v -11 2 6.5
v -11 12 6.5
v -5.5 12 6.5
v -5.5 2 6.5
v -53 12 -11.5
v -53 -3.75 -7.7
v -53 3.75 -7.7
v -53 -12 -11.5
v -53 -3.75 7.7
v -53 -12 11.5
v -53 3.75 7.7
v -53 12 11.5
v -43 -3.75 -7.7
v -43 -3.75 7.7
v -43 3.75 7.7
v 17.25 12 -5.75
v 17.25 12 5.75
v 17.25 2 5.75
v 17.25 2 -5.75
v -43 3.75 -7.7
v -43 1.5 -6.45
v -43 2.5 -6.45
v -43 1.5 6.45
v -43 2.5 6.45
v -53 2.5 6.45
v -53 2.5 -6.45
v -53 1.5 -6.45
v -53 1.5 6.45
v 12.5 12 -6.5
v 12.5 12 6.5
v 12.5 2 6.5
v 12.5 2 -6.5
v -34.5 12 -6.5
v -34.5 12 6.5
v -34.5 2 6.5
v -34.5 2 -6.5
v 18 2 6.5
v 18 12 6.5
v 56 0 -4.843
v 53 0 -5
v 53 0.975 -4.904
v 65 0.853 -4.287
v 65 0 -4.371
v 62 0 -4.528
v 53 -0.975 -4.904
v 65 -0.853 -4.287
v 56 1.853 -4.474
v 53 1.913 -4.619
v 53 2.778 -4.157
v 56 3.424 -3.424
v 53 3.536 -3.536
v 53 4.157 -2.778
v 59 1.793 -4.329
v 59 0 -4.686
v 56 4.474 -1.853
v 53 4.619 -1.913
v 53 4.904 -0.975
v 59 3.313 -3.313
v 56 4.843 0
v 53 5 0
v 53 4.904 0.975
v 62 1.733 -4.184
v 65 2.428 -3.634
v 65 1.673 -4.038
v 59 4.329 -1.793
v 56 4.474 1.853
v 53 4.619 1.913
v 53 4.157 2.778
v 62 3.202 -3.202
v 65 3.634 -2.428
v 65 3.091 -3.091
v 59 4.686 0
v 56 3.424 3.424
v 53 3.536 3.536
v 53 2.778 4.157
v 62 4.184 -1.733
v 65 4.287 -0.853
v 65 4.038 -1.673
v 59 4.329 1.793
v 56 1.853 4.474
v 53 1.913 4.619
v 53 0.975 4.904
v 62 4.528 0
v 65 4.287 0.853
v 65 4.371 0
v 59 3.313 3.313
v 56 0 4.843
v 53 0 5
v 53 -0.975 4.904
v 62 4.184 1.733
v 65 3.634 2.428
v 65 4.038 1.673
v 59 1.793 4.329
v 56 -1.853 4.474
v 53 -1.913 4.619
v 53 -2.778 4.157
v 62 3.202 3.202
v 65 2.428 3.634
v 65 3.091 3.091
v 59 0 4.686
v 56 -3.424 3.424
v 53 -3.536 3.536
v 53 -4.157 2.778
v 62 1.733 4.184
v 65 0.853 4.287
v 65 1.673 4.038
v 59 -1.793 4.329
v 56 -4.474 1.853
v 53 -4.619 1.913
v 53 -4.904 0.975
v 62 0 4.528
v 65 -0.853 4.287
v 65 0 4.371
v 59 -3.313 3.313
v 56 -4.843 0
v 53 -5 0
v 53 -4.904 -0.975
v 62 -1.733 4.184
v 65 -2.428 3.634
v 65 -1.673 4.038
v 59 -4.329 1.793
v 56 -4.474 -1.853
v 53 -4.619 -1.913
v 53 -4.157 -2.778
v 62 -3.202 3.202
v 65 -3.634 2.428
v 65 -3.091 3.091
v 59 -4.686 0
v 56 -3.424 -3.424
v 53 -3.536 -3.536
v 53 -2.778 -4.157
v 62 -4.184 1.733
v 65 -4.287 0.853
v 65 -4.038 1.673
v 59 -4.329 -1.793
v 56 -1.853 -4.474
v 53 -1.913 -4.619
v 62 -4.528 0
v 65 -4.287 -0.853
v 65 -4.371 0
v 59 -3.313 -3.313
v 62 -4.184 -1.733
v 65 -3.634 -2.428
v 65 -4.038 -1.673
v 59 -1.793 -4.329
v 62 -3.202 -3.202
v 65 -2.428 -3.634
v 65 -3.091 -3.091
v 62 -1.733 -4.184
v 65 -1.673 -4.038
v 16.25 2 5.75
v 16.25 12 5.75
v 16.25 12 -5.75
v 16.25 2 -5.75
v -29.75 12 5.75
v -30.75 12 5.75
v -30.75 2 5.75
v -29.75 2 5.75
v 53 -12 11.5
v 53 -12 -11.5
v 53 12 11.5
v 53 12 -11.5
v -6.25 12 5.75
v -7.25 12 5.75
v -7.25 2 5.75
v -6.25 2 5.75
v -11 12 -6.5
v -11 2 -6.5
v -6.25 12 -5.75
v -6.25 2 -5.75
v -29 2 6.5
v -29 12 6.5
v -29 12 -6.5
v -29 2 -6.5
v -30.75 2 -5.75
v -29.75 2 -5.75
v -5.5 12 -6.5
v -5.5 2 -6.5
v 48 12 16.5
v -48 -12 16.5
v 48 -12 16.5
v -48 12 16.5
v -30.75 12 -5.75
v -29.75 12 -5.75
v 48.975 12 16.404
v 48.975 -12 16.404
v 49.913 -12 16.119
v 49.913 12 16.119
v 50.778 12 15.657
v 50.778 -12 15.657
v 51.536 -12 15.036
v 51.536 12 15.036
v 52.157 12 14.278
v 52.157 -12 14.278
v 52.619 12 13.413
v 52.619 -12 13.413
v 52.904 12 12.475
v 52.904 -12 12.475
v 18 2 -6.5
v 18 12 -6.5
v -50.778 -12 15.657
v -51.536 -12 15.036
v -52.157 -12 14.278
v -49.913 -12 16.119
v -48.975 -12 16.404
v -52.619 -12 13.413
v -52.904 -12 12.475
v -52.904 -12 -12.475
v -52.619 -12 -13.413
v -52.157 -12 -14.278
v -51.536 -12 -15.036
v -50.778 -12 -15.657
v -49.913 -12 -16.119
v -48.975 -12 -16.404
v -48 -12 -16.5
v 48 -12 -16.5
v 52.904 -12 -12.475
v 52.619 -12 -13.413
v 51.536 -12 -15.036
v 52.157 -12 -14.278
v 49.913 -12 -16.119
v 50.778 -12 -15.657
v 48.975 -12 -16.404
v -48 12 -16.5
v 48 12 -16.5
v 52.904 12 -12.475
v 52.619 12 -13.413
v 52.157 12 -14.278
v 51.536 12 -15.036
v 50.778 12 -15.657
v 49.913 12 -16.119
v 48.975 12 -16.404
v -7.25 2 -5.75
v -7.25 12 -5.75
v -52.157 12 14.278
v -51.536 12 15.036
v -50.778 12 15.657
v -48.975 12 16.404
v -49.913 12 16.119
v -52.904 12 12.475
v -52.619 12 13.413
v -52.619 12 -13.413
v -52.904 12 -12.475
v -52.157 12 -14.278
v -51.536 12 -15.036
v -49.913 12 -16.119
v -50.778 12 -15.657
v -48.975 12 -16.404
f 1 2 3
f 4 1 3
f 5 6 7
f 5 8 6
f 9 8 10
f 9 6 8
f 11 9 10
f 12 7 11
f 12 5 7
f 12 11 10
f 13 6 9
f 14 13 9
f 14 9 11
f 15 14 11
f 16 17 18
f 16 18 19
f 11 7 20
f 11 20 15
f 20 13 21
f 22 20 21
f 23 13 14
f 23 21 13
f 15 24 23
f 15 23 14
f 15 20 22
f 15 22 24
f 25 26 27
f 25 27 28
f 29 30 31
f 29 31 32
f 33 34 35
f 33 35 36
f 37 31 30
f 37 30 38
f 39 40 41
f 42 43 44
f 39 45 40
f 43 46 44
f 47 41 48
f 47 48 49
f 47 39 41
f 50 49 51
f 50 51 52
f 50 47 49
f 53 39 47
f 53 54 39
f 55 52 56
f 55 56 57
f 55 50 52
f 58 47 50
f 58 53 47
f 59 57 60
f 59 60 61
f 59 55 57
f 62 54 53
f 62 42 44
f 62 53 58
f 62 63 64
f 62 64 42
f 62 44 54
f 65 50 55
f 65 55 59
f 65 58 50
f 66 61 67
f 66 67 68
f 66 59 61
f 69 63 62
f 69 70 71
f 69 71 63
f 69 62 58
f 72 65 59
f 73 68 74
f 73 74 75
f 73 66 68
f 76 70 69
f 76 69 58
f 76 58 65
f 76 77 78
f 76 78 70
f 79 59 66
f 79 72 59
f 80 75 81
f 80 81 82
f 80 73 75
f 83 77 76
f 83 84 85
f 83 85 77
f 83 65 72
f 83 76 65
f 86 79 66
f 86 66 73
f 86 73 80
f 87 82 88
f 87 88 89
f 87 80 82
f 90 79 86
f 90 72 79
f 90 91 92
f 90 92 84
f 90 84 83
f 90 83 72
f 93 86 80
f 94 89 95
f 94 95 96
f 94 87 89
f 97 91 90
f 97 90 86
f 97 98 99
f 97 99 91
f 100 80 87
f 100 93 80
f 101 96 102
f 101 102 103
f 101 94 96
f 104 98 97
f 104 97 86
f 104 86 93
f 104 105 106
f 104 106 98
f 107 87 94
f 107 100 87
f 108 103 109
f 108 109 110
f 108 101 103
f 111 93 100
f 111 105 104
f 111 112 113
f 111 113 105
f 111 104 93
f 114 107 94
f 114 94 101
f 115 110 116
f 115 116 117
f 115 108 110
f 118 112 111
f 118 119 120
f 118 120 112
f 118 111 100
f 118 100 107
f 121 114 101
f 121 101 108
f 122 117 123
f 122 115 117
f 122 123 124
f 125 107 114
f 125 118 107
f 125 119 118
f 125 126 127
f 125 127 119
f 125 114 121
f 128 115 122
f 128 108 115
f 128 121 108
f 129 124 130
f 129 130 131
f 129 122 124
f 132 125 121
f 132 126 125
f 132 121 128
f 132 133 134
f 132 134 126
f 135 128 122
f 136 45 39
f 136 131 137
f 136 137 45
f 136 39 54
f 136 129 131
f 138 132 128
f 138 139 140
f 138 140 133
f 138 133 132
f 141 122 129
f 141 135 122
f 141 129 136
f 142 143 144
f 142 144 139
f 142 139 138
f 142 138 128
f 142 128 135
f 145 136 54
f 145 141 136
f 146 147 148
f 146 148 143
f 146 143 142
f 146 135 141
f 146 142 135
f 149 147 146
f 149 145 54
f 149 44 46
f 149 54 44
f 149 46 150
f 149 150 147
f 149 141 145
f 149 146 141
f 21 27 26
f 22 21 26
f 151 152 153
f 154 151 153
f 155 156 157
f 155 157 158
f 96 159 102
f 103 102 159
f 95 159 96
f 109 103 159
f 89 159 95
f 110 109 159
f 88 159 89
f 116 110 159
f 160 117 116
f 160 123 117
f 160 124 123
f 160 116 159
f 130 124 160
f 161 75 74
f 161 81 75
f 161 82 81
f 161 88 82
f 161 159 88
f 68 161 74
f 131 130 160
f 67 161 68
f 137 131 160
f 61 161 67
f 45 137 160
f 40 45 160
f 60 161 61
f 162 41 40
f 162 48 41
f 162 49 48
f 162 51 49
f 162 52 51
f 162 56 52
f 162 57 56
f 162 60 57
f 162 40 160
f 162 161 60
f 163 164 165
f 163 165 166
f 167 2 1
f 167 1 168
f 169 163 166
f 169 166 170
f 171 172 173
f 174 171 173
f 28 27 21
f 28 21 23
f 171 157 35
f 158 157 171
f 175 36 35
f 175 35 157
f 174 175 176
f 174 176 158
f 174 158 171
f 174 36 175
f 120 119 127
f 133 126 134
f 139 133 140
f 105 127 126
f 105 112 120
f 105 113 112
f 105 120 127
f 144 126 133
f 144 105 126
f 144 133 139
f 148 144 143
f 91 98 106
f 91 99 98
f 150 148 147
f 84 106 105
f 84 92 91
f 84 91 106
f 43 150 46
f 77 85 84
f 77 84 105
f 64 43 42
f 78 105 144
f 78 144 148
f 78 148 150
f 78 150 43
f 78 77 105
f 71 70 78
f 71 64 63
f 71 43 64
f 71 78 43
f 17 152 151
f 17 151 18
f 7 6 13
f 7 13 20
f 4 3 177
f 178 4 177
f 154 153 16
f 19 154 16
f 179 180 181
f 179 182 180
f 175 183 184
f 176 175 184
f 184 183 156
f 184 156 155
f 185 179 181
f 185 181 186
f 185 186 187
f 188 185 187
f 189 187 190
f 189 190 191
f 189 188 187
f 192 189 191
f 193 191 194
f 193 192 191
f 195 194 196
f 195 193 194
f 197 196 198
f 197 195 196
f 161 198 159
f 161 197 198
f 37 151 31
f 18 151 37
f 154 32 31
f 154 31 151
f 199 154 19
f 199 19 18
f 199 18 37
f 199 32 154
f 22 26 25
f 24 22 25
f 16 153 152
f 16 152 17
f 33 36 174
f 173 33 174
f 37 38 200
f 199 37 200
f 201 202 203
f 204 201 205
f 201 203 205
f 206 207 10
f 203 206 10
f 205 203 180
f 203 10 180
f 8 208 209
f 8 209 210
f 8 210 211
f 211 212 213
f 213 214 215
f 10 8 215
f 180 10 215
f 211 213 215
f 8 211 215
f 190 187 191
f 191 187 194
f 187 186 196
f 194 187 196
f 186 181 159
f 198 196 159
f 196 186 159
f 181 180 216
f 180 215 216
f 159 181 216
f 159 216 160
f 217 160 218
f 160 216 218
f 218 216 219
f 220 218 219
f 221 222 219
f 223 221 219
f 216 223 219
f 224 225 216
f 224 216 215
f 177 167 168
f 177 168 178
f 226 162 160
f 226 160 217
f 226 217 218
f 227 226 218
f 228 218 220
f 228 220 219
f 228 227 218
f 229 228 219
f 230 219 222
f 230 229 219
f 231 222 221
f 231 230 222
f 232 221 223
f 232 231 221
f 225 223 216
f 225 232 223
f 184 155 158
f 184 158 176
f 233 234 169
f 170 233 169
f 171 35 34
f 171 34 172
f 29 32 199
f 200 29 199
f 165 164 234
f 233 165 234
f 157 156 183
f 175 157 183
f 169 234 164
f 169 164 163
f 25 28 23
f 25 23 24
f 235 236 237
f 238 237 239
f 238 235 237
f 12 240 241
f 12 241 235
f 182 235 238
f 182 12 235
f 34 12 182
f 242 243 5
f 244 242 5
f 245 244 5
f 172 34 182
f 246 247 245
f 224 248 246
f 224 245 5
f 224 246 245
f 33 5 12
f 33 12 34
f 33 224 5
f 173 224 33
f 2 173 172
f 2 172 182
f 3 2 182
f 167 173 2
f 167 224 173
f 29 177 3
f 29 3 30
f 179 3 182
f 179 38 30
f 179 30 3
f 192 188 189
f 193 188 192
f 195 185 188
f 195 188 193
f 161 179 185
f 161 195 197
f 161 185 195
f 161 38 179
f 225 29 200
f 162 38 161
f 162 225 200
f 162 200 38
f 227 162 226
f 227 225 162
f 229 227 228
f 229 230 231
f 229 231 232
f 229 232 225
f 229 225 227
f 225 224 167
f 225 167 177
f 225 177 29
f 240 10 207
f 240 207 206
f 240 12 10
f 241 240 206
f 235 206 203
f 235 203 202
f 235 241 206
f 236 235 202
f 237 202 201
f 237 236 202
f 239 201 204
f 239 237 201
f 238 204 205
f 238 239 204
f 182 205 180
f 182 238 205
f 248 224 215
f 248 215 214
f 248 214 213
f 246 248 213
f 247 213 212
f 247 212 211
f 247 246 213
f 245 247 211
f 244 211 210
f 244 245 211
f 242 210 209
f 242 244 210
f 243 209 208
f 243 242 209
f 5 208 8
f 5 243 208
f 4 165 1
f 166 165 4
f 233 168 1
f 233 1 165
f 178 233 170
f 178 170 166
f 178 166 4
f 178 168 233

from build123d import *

# Parameters (mm, degrees)
BOSS_EXTRUDE1_DEPTH = 12
SKETCH2_W           = 5.5
SKETCH2_H           = 13
SKETCH2_W_2         = 1
SKETCH2_H_2         = 11.5
CUT_EXTRUDE1_DEPTH  = 10
SKETCH3_W           = 15.4
SKETCH3_H           = 7.5
SKETCH3_W_2         = 12.9
SKETCH3_H_2         = 1
CUT_EXTRUDE2_DEPTH  = 10
SKETCH4_R           = 5
BOSS_EXTRUDE2_DEPTH = 12
BOSS_EXTRUDE2_TAPER = 3


with BuildPart() as part:
    # Sketch1 → Boss-Extrude1 (new, symmetric)
    with BuildSketch(Plane(origin=(0, 0, 0), x_dir=(1, 0, 0), z_dir=(0, 1, 0))):
        with BuildLine():
            Line((-48, -16.5), (48, -16.5))
            ThreePointArc((48, -16.5), (51.535533906, -15.035533906), (53, -11.5))
            Line((53, -11.5), (53, 11.5))
            ThreePointArc((53, 11.5), (51.535533906, 15.035533906), (48, 16.5))
            Line((48, 16.5), (-48, 16.5))
            ThreePointArc((-48, 16.5), (-51.535533906, 15.035533906), (-53, 11.5))
            Line((-53, 11.5), (-53, -11.5))
            ThreePointArc((-53, -11.5), (-51.535533906, -15.035533906), (-48, -16.5))
        make_face()
    extrude(amount=BOSS_EXTRUDE1_DEPTH, both=True)

    # Sketch2 → Cut-Extrude1 (cut)
    # profile 1 of 3: a face of its own
    with BuildSketch(Plane(origin=(0, 12, 0), x_dir=(1, 0, 0), z_dir=(0, 1, 0))):
        with Locations((15.25, 0)):
            Rectangle(SKETCH2_W, SKETCH2_H)
        with Locations((16.75, 0)):
            Rectangle(SKETCH2_W_2, SKETCH2_H_2, mode=Mode.SUBTRACT)
    # profile 2 of 3: a face of its own
    with BuildSketch(Plane(origin=(0, 12, 0), x_dir=(1, 0, 0), z_dir=(0, 1, 0))):
        with Locations((-8.25, 0)):
            Rectangle(SKETCH2_W, SKETCH2_H)
        with Locations((-6.75, 0)):
            Rectangle(SKETCH2_W_2, SKETCH2_H_2, mode=Mode.SUBTRACT)
    # profile 3 of 3: a face of its own
    with BuildSketch(Plane(origin=(0, 12, 0), x_dir=(1, 0, 0), z_dir=(0, 1, 0))):
        with Locations((-31.75, 0)):
            Rectangle(SKETCH2_W, SKETCH2_H)
        with Locations((-30.25, 0)):
            Rectangle(SKETCH2_W_2, SKETCH2_H_2, mode=Mode.SUBTRACT)
    extrude(amount=-CUT_EXTRUDE1_DEPTH, mode=Mode.SUBTRACT)

    # Sketch3 → Cut-Extrude2 (cut)
    with BuildSketch(Plane.ZY.offset(53)):
        Rectangle(SKETCH3_W, SKETCH3_H)
        with Locations((0, 2)):
            Rectangle(SKETCH3_W_2, SKETCH3_H_2, mode=Mode.SUBTRACT)
    extrude(amount=-CUT_EXTRUDE2_DEPTH, mode=Mode.SUBTRACT)

    # Sketch4 → Boss-Extrude2 (add)
    with BuildSketch(Plane(origin=(53, 0, 0), x_dir=(0, 0, -1), z_dir=(1, 0, 0))):
        Circle(SKETCH4_R)
    extrude(amount=BOSS_EXTRUDE2_DEPTH, taper=BOSS_EXTRUDE2_TAPER)


solid = part.part
